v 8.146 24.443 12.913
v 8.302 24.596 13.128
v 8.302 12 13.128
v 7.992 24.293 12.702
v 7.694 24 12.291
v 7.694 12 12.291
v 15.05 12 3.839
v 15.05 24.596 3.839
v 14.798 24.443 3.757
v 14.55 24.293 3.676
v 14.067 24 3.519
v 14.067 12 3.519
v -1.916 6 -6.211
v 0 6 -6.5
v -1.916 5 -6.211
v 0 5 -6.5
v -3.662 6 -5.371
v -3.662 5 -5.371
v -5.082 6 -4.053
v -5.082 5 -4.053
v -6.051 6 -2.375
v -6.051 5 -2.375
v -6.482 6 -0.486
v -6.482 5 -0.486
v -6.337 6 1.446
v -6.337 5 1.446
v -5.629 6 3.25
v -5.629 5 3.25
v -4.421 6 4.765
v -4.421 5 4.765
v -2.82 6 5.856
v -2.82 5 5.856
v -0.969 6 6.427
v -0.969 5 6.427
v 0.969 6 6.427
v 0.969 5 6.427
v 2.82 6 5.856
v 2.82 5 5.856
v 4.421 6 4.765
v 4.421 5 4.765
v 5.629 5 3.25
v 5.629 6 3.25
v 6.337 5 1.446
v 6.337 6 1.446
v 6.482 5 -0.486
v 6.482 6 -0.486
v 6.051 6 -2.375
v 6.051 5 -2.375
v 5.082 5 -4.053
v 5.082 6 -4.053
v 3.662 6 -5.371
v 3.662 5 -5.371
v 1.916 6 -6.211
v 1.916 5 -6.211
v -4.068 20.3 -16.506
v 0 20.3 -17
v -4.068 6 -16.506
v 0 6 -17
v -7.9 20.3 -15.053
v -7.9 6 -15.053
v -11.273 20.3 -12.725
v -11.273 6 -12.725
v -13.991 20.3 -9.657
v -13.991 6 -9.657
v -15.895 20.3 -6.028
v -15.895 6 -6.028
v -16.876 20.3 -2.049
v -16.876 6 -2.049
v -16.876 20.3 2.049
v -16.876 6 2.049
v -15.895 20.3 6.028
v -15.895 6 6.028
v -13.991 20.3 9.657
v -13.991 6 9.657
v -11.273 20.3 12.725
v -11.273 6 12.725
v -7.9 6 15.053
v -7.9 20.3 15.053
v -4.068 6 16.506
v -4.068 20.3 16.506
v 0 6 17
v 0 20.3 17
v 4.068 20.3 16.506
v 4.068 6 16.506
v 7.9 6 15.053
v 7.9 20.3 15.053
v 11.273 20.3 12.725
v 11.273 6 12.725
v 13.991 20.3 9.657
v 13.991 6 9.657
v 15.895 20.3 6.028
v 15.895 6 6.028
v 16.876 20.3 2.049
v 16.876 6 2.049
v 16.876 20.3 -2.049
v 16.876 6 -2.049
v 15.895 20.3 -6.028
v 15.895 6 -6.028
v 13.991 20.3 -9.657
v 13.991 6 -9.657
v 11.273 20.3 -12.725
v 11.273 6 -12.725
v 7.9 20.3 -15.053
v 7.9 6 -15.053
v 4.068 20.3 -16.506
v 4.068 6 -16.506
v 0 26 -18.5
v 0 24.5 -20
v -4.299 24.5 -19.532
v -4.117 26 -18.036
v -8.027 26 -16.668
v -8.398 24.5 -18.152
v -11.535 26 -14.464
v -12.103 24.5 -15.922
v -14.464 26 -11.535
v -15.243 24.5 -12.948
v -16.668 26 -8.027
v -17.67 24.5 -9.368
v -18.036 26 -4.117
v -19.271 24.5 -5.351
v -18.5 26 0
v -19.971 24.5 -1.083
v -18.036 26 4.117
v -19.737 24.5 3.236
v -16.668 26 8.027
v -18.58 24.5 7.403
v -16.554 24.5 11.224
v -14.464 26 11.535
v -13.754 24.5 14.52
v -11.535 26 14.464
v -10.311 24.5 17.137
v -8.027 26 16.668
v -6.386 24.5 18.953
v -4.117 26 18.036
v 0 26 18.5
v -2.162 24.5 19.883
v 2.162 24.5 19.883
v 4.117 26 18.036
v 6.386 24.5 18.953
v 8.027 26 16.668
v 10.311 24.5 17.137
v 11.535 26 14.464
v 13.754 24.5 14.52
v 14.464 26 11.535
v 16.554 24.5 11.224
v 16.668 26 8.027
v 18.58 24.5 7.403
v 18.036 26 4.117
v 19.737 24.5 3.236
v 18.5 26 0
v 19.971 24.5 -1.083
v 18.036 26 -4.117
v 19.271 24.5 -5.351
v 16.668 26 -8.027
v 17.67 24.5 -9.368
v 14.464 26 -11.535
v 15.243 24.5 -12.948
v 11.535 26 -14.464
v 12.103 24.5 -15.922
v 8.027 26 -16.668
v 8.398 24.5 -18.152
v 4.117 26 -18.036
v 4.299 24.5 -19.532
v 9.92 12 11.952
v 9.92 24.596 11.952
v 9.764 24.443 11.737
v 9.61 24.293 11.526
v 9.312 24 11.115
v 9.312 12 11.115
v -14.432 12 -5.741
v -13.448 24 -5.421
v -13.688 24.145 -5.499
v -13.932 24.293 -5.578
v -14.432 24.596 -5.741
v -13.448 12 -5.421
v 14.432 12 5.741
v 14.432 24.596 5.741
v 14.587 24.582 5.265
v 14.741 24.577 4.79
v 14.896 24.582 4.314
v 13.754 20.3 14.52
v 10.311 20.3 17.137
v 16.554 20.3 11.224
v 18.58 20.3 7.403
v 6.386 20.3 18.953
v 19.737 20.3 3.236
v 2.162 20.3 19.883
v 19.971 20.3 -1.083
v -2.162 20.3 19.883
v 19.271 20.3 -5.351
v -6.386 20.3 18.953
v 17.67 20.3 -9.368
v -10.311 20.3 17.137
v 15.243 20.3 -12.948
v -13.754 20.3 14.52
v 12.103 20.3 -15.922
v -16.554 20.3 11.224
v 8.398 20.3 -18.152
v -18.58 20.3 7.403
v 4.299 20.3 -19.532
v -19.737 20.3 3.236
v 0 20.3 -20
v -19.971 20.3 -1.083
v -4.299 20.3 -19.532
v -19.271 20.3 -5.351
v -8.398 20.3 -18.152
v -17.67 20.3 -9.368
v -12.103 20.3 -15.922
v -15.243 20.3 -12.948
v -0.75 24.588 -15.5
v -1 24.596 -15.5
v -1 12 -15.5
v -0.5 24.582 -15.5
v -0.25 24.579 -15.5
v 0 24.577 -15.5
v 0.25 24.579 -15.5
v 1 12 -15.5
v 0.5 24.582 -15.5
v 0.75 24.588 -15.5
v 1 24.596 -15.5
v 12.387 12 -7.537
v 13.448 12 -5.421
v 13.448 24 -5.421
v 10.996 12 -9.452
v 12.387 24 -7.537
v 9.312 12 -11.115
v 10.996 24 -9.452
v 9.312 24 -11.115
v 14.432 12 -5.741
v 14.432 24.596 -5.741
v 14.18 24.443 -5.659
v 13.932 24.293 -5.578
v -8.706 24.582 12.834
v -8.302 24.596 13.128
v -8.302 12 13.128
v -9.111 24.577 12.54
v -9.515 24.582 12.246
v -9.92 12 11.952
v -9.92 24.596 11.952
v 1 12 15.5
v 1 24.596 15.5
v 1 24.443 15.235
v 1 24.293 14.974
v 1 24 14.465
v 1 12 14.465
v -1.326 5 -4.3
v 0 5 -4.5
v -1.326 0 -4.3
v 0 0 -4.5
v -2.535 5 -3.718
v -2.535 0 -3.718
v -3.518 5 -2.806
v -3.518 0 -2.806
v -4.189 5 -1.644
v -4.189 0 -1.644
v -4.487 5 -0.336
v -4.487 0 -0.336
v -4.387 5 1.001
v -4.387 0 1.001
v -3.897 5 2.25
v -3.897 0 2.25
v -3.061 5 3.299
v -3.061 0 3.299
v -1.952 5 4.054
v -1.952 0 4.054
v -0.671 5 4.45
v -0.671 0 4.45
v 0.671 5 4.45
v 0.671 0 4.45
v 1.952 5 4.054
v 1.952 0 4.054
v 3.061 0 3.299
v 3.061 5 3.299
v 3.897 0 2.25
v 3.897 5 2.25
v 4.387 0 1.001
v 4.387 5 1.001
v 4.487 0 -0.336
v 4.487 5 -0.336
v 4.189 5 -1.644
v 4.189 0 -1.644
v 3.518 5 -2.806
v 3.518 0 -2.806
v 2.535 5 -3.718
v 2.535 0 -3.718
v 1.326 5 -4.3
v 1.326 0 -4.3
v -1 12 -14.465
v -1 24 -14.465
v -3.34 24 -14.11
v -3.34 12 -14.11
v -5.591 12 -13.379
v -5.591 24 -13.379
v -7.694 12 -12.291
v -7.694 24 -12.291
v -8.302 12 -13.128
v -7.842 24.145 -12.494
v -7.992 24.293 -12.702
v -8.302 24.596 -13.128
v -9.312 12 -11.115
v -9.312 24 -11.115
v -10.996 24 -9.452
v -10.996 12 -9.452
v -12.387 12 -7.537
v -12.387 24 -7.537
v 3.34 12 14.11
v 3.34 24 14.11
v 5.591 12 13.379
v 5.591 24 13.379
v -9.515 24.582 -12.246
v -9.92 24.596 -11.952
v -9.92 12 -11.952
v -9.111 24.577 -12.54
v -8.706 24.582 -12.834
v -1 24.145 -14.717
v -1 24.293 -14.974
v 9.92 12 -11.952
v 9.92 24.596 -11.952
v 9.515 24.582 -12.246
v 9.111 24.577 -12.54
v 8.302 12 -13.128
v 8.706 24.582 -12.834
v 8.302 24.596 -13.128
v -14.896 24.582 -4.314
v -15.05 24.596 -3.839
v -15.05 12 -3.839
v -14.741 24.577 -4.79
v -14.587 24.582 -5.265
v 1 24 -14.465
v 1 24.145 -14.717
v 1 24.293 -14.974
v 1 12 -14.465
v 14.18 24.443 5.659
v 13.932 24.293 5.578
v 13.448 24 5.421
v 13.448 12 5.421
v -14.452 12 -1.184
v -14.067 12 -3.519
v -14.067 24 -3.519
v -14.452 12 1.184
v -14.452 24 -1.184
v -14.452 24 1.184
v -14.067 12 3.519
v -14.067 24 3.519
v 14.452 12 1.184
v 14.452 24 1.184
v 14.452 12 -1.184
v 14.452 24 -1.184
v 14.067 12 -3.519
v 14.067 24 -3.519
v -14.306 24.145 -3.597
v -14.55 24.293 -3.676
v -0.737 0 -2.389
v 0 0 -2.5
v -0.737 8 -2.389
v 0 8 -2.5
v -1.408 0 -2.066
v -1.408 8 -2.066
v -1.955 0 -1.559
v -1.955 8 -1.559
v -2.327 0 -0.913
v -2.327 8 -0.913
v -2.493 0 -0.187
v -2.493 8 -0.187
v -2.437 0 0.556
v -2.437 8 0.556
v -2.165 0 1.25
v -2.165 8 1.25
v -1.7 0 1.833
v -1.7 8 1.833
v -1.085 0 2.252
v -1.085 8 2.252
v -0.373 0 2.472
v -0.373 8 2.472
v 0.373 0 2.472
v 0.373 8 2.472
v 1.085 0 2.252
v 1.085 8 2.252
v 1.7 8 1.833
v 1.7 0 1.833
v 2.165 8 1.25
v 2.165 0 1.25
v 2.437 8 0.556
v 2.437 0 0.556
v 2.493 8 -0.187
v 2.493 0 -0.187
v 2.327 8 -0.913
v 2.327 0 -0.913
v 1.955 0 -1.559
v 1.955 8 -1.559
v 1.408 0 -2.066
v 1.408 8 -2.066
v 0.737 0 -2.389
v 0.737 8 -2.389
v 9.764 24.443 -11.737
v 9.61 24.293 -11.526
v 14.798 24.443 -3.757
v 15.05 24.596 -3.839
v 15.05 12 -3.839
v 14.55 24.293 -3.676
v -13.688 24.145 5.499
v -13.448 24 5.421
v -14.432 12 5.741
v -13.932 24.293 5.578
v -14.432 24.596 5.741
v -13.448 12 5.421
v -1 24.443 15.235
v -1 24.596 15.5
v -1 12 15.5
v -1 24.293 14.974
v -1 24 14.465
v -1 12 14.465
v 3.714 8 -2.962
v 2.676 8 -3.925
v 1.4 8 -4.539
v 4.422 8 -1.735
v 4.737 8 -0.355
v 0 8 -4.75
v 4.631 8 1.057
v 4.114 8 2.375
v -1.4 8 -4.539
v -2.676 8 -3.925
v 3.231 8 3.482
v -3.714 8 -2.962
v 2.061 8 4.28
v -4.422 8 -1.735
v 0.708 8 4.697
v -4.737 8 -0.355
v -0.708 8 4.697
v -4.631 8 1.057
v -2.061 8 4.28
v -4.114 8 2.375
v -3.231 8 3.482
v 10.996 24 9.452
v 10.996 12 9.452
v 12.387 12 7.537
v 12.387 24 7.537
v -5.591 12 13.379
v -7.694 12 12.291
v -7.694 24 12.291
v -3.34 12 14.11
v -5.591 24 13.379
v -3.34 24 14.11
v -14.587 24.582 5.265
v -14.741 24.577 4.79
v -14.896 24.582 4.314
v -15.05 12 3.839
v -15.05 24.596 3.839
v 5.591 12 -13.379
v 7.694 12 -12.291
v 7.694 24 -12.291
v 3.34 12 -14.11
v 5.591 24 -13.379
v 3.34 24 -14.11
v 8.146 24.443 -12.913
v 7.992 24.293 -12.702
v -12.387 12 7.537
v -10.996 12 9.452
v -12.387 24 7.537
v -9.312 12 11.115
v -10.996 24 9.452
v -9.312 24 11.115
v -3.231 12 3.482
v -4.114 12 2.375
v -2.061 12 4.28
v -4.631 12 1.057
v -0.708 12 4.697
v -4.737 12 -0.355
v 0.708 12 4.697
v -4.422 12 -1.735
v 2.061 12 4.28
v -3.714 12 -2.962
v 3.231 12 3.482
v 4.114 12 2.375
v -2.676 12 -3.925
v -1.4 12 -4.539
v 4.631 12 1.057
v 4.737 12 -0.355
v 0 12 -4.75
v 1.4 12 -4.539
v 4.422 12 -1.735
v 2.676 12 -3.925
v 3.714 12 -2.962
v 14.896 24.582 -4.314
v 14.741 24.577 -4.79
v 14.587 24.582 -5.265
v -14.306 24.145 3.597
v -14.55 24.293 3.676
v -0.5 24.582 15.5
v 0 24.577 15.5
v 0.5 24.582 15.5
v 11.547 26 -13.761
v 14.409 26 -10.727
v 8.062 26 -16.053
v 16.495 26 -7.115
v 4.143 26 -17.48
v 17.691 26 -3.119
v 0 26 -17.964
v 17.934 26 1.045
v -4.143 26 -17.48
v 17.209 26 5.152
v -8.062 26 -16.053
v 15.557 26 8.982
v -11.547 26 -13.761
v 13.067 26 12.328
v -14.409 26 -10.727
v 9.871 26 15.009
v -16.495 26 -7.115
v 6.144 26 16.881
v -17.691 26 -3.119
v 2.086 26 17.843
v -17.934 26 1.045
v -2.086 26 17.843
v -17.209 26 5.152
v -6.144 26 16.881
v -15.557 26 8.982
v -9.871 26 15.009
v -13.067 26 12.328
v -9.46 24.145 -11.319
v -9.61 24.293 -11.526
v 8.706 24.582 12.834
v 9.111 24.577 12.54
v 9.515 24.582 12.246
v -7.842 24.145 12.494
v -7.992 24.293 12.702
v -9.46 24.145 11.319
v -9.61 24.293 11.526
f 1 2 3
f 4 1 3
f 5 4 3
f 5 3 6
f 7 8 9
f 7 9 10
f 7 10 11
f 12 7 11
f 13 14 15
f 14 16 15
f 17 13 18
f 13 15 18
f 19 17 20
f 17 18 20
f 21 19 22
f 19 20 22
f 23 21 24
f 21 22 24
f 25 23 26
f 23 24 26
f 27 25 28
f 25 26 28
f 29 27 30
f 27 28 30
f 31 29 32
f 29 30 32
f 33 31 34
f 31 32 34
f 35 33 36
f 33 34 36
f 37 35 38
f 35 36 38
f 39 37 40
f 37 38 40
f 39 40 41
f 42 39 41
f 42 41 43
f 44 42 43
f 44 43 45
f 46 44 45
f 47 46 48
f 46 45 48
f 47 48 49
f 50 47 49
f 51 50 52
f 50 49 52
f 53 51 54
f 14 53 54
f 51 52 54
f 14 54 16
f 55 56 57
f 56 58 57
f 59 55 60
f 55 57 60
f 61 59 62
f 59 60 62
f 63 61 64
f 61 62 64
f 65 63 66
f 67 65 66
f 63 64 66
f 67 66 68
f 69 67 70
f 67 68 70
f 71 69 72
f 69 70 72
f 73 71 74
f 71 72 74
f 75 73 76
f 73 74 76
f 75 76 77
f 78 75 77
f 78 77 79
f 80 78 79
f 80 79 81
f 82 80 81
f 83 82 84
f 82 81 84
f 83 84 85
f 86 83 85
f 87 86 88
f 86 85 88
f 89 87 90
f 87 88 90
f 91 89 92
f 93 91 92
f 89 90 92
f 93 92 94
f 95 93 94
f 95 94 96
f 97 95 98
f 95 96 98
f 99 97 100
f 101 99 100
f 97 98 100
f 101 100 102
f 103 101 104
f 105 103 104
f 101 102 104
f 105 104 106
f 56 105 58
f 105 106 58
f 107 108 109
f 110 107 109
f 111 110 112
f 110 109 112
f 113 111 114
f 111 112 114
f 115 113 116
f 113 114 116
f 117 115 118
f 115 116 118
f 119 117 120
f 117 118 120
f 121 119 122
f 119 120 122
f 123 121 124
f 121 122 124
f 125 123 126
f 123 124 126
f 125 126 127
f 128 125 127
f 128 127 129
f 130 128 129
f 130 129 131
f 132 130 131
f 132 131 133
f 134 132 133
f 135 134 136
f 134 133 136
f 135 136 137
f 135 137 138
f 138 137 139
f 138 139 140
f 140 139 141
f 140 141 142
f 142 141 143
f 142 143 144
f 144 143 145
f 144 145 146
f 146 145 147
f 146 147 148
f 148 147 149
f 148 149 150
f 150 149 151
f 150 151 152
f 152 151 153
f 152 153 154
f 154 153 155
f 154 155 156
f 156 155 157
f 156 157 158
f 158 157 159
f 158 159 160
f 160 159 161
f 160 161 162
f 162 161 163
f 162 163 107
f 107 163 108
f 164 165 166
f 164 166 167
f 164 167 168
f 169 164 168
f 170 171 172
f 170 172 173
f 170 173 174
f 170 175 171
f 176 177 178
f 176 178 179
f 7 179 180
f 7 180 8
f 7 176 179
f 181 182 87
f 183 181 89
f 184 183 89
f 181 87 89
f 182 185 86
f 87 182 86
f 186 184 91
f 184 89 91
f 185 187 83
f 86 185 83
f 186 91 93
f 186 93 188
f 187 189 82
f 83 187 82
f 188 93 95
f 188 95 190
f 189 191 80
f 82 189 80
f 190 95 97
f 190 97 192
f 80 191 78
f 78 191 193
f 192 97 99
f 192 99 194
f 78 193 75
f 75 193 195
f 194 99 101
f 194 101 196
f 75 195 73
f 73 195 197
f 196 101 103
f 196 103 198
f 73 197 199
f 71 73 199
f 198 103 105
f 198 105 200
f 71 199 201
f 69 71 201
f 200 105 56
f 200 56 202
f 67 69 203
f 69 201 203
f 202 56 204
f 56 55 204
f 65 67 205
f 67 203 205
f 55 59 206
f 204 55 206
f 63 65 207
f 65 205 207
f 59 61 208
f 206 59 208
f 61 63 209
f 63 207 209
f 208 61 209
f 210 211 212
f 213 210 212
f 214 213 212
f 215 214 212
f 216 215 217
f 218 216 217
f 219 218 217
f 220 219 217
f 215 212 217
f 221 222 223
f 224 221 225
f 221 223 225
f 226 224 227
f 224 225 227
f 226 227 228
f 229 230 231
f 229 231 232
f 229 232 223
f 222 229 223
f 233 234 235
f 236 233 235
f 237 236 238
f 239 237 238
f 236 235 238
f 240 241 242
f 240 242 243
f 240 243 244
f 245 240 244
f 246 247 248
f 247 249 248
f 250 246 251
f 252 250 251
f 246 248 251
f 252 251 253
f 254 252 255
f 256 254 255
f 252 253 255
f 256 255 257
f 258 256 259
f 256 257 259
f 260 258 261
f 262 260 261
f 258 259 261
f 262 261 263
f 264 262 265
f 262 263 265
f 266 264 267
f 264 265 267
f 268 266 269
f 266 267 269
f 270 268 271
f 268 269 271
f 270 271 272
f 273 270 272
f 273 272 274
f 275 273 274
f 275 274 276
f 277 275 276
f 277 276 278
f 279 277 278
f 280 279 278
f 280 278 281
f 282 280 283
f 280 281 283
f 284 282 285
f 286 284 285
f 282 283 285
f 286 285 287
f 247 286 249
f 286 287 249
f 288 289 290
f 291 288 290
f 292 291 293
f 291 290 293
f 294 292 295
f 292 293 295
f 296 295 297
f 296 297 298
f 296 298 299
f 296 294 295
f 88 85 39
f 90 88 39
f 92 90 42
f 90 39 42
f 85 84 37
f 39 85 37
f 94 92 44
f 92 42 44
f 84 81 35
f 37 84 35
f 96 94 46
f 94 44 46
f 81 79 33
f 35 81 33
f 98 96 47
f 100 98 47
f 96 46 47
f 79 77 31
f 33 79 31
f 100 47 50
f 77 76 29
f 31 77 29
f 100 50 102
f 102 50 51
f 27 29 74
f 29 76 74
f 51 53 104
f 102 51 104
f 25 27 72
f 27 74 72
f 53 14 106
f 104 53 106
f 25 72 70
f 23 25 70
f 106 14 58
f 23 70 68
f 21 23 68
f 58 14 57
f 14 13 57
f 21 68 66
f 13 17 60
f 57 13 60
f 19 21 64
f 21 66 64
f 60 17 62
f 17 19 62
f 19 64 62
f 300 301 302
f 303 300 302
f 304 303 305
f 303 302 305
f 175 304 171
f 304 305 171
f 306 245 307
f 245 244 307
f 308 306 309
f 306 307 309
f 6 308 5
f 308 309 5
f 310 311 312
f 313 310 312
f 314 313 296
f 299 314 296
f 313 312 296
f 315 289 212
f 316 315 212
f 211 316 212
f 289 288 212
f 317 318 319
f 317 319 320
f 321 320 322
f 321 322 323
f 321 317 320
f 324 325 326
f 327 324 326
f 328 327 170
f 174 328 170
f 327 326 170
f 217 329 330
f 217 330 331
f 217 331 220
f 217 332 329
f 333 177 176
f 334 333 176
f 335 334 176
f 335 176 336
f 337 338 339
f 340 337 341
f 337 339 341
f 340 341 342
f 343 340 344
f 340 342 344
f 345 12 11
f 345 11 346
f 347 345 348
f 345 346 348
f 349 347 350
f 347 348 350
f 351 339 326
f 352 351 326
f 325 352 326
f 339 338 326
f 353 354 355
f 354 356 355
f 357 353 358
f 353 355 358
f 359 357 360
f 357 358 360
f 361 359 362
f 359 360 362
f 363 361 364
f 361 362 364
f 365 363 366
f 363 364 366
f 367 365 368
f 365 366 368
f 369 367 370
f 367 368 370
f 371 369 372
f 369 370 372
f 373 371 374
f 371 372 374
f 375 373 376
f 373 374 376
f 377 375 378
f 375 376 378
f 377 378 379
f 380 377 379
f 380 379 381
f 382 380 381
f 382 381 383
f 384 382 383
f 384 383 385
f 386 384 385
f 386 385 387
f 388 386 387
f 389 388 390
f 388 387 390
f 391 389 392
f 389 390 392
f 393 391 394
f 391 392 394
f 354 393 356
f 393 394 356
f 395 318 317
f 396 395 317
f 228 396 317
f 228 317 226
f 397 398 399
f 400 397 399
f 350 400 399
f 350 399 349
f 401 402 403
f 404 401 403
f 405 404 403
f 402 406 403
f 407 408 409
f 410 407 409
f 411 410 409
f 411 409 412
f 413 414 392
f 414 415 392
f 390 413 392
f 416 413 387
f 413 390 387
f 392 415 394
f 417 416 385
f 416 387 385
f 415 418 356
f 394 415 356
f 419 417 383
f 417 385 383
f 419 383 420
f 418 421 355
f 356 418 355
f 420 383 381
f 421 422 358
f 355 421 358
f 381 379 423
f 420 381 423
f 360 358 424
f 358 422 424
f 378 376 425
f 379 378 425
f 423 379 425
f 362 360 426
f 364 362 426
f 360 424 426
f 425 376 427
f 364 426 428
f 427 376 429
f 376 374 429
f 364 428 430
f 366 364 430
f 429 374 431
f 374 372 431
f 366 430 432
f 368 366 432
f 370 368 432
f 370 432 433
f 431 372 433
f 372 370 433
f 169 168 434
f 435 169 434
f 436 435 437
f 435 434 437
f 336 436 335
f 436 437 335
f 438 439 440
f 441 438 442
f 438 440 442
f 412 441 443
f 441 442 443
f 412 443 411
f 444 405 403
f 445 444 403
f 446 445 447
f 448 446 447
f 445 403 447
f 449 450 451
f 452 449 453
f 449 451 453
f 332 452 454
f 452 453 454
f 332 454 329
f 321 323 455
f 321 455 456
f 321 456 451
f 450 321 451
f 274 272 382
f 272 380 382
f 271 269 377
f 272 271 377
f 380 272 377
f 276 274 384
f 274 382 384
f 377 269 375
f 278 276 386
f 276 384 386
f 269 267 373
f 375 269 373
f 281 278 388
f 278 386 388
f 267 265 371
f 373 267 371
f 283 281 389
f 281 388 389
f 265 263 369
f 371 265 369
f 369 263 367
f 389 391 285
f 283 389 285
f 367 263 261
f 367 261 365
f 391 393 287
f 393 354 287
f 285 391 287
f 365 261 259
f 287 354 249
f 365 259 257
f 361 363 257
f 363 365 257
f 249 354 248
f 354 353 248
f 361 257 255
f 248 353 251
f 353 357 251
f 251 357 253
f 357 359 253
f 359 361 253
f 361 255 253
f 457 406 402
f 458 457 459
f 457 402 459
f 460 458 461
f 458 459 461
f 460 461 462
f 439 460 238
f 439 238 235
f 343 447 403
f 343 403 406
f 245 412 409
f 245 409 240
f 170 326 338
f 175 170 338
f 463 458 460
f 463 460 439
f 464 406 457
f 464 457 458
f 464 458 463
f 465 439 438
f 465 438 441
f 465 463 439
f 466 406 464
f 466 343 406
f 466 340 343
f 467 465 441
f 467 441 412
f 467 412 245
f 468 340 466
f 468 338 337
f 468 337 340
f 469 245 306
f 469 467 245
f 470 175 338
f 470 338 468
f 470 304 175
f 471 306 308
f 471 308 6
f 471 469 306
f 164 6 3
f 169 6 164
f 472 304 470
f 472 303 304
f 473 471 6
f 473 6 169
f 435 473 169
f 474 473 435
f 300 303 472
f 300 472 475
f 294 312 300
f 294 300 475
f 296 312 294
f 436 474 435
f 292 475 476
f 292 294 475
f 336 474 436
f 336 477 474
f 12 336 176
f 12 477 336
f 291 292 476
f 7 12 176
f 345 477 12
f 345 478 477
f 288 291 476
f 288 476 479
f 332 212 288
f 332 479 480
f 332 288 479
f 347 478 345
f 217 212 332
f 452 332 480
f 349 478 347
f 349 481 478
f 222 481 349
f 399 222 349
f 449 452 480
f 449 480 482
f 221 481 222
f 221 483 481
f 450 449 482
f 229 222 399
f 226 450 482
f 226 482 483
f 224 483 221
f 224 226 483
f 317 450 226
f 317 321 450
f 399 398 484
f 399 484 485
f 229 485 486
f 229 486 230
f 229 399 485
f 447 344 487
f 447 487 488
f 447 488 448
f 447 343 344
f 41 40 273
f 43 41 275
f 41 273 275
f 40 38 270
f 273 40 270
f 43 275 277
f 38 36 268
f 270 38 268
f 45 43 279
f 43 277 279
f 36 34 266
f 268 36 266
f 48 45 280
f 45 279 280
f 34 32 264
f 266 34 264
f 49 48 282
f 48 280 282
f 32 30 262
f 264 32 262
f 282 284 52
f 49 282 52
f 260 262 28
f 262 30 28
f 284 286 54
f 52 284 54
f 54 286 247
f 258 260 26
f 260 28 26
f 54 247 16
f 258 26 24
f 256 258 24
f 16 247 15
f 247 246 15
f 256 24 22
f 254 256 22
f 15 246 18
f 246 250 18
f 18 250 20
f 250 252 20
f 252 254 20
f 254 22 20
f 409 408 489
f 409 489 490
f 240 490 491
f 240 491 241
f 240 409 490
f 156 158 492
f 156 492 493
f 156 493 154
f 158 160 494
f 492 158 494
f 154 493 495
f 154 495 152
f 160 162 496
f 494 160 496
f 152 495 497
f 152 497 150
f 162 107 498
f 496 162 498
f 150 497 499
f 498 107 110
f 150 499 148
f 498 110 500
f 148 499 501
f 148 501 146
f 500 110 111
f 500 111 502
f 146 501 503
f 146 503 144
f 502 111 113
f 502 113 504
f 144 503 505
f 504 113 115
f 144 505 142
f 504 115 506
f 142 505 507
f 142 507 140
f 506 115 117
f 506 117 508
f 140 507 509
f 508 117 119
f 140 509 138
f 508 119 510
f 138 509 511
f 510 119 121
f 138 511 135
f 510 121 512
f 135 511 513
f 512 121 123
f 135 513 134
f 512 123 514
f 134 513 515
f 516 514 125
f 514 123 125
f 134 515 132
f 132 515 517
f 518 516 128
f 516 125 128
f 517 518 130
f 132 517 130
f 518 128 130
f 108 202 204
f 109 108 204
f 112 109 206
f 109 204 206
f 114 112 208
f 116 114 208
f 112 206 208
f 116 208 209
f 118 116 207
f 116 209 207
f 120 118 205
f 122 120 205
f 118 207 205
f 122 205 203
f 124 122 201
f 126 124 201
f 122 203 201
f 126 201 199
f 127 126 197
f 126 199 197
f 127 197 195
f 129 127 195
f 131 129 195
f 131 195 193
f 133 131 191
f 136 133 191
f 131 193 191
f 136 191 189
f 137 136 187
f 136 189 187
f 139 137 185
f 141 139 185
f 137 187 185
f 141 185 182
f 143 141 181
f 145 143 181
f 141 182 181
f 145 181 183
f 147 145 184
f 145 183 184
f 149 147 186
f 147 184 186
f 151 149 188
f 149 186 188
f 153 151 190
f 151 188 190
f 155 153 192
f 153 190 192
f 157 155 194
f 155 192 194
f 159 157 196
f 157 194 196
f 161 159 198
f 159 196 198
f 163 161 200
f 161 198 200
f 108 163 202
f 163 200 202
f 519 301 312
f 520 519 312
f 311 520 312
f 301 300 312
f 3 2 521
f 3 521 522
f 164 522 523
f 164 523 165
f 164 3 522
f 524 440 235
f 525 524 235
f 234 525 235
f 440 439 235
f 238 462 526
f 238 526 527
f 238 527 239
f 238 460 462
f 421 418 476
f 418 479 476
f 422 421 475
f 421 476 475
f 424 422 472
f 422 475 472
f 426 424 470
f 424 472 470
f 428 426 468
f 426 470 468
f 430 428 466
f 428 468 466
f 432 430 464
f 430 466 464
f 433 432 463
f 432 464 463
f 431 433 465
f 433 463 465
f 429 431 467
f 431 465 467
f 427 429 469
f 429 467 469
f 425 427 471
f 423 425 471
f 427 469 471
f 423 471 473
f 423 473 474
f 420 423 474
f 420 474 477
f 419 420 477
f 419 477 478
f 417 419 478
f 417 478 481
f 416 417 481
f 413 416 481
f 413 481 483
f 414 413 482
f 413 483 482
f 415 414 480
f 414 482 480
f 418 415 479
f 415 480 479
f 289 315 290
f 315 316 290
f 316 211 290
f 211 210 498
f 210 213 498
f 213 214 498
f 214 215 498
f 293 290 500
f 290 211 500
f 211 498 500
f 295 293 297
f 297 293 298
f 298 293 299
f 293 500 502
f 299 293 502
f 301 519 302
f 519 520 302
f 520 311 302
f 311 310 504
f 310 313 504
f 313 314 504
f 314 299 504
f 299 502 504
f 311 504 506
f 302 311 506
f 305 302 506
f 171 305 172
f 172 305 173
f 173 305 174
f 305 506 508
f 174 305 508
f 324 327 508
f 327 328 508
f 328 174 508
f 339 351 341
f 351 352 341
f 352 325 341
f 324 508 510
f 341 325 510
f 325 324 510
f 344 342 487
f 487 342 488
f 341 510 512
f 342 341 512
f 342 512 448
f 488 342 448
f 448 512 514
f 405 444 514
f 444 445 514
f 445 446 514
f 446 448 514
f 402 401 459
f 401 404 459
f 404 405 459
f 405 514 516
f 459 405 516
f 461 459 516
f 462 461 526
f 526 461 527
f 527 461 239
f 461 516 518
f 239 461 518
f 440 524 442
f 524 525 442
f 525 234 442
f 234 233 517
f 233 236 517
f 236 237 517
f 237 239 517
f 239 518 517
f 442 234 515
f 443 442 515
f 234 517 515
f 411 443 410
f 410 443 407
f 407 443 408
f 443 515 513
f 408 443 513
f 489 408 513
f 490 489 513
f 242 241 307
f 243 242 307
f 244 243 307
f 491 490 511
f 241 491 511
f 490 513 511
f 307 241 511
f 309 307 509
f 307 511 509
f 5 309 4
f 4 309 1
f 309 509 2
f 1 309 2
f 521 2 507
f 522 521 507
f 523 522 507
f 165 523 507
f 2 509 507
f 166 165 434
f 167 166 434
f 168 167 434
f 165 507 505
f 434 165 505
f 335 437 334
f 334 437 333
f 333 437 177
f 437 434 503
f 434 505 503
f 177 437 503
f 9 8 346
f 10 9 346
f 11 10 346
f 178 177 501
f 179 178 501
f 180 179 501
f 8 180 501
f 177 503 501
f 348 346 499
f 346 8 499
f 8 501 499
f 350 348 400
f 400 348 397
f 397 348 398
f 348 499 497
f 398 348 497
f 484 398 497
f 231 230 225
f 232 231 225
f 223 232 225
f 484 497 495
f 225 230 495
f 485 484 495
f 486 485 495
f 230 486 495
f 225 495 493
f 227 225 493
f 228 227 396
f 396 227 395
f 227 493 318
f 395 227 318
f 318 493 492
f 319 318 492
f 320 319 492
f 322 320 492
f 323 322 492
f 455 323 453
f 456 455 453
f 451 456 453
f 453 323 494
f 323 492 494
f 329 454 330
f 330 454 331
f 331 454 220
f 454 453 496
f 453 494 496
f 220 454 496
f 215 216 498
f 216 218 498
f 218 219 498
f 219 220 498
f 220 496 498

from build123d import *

# Parameters (mm, degrees)
CHAMFER_1_SIZE           = 2
CHAMFER_1_SIZE2          = 3.464101615
CHAMFER_2_SIZE           = 1.5
SKETCH_2_W               = 2
SKETCH_2_H               = 31
CUT_EXTRUDE_1_DEPTH      = 32.559467676
PATTERN_CIRCULAR_1_COUNT = 10


with BuildPart() as part:
    # 草图1 → 旋转1 (revolve)
    with BuildSketch(Plane.XY, mode=Mode.PRIVATE) as revolve_1_sk:
        Polygon((-2.5, 0), (-2.5, 8), (-4.75, 8), (-4.75, 12), (-14.5, 12), (-14.5, 26), (-20, 26), (-20, 20.3), (-17, 20.3), (-17, 6), (-6.5, 6), (-6.5, 5), (-4.5, 5), (-4.5, 0), align=None)
    revolve(revolve_1_sk.sketch.rotate(Axis((0, 0, 0), (0, 1, 0)), 270), axis=Axis((0, 0, 0), (0, 1, 0)))

    # 倒角1
    chamfer_1_edges = [part.edges().sort_by_distance(p)[0] for p in [
        (0, 26, 14.5),
    ]]
    chamfer_1_side = [part.faces().sort_by_distance(p)[0] for p in [
        (0, 19, 14.5),
    ]]
    chamfer(chamfer_1_edges, length=CHAMFER_1_SIZE, length2=CHAMFER_1_SIZE2, reference=chamfer_1_side[0])

    # 倒角2
    chamfer_2_edges = [part.edges().sort_by_distance(p)[0] for p in [
        (0, 26, 20),
    ]]
    chamfer(chamfer_2_edges, length=CHAMFER_2_SIZE)

    # 草图2 → 切除-拉伸1 (cut, through all)
    with BuildSketch(Plane(origin=(0, 12, 0), x_dir=(1, 0, 0), z_dir=(0, 1, 0))):
        Rectangle(SKETCH_2_W, SKETCH_2_H)
    cut_extrude_1 = extrude(amount=CUT_EXTRUDE_1_DEPTH, mode=Mode.SUBTRACT)

    # 阵列(圆周)1: 切除-拉伸1 ×10 about axis
    pattern_circular_1_axis = Axis((0, 0, 0), (0, 1, 0))
    for i in range(1, PATTERN_CIRCULAR_1_COUNT):
        add(cut_extrude_1.rotate(pattern_circular_1_axis, i * 360 / PATTERN_CIRCULAR_1_COUNT), mode=Mode.SUBTRACT)


solid = part.part
